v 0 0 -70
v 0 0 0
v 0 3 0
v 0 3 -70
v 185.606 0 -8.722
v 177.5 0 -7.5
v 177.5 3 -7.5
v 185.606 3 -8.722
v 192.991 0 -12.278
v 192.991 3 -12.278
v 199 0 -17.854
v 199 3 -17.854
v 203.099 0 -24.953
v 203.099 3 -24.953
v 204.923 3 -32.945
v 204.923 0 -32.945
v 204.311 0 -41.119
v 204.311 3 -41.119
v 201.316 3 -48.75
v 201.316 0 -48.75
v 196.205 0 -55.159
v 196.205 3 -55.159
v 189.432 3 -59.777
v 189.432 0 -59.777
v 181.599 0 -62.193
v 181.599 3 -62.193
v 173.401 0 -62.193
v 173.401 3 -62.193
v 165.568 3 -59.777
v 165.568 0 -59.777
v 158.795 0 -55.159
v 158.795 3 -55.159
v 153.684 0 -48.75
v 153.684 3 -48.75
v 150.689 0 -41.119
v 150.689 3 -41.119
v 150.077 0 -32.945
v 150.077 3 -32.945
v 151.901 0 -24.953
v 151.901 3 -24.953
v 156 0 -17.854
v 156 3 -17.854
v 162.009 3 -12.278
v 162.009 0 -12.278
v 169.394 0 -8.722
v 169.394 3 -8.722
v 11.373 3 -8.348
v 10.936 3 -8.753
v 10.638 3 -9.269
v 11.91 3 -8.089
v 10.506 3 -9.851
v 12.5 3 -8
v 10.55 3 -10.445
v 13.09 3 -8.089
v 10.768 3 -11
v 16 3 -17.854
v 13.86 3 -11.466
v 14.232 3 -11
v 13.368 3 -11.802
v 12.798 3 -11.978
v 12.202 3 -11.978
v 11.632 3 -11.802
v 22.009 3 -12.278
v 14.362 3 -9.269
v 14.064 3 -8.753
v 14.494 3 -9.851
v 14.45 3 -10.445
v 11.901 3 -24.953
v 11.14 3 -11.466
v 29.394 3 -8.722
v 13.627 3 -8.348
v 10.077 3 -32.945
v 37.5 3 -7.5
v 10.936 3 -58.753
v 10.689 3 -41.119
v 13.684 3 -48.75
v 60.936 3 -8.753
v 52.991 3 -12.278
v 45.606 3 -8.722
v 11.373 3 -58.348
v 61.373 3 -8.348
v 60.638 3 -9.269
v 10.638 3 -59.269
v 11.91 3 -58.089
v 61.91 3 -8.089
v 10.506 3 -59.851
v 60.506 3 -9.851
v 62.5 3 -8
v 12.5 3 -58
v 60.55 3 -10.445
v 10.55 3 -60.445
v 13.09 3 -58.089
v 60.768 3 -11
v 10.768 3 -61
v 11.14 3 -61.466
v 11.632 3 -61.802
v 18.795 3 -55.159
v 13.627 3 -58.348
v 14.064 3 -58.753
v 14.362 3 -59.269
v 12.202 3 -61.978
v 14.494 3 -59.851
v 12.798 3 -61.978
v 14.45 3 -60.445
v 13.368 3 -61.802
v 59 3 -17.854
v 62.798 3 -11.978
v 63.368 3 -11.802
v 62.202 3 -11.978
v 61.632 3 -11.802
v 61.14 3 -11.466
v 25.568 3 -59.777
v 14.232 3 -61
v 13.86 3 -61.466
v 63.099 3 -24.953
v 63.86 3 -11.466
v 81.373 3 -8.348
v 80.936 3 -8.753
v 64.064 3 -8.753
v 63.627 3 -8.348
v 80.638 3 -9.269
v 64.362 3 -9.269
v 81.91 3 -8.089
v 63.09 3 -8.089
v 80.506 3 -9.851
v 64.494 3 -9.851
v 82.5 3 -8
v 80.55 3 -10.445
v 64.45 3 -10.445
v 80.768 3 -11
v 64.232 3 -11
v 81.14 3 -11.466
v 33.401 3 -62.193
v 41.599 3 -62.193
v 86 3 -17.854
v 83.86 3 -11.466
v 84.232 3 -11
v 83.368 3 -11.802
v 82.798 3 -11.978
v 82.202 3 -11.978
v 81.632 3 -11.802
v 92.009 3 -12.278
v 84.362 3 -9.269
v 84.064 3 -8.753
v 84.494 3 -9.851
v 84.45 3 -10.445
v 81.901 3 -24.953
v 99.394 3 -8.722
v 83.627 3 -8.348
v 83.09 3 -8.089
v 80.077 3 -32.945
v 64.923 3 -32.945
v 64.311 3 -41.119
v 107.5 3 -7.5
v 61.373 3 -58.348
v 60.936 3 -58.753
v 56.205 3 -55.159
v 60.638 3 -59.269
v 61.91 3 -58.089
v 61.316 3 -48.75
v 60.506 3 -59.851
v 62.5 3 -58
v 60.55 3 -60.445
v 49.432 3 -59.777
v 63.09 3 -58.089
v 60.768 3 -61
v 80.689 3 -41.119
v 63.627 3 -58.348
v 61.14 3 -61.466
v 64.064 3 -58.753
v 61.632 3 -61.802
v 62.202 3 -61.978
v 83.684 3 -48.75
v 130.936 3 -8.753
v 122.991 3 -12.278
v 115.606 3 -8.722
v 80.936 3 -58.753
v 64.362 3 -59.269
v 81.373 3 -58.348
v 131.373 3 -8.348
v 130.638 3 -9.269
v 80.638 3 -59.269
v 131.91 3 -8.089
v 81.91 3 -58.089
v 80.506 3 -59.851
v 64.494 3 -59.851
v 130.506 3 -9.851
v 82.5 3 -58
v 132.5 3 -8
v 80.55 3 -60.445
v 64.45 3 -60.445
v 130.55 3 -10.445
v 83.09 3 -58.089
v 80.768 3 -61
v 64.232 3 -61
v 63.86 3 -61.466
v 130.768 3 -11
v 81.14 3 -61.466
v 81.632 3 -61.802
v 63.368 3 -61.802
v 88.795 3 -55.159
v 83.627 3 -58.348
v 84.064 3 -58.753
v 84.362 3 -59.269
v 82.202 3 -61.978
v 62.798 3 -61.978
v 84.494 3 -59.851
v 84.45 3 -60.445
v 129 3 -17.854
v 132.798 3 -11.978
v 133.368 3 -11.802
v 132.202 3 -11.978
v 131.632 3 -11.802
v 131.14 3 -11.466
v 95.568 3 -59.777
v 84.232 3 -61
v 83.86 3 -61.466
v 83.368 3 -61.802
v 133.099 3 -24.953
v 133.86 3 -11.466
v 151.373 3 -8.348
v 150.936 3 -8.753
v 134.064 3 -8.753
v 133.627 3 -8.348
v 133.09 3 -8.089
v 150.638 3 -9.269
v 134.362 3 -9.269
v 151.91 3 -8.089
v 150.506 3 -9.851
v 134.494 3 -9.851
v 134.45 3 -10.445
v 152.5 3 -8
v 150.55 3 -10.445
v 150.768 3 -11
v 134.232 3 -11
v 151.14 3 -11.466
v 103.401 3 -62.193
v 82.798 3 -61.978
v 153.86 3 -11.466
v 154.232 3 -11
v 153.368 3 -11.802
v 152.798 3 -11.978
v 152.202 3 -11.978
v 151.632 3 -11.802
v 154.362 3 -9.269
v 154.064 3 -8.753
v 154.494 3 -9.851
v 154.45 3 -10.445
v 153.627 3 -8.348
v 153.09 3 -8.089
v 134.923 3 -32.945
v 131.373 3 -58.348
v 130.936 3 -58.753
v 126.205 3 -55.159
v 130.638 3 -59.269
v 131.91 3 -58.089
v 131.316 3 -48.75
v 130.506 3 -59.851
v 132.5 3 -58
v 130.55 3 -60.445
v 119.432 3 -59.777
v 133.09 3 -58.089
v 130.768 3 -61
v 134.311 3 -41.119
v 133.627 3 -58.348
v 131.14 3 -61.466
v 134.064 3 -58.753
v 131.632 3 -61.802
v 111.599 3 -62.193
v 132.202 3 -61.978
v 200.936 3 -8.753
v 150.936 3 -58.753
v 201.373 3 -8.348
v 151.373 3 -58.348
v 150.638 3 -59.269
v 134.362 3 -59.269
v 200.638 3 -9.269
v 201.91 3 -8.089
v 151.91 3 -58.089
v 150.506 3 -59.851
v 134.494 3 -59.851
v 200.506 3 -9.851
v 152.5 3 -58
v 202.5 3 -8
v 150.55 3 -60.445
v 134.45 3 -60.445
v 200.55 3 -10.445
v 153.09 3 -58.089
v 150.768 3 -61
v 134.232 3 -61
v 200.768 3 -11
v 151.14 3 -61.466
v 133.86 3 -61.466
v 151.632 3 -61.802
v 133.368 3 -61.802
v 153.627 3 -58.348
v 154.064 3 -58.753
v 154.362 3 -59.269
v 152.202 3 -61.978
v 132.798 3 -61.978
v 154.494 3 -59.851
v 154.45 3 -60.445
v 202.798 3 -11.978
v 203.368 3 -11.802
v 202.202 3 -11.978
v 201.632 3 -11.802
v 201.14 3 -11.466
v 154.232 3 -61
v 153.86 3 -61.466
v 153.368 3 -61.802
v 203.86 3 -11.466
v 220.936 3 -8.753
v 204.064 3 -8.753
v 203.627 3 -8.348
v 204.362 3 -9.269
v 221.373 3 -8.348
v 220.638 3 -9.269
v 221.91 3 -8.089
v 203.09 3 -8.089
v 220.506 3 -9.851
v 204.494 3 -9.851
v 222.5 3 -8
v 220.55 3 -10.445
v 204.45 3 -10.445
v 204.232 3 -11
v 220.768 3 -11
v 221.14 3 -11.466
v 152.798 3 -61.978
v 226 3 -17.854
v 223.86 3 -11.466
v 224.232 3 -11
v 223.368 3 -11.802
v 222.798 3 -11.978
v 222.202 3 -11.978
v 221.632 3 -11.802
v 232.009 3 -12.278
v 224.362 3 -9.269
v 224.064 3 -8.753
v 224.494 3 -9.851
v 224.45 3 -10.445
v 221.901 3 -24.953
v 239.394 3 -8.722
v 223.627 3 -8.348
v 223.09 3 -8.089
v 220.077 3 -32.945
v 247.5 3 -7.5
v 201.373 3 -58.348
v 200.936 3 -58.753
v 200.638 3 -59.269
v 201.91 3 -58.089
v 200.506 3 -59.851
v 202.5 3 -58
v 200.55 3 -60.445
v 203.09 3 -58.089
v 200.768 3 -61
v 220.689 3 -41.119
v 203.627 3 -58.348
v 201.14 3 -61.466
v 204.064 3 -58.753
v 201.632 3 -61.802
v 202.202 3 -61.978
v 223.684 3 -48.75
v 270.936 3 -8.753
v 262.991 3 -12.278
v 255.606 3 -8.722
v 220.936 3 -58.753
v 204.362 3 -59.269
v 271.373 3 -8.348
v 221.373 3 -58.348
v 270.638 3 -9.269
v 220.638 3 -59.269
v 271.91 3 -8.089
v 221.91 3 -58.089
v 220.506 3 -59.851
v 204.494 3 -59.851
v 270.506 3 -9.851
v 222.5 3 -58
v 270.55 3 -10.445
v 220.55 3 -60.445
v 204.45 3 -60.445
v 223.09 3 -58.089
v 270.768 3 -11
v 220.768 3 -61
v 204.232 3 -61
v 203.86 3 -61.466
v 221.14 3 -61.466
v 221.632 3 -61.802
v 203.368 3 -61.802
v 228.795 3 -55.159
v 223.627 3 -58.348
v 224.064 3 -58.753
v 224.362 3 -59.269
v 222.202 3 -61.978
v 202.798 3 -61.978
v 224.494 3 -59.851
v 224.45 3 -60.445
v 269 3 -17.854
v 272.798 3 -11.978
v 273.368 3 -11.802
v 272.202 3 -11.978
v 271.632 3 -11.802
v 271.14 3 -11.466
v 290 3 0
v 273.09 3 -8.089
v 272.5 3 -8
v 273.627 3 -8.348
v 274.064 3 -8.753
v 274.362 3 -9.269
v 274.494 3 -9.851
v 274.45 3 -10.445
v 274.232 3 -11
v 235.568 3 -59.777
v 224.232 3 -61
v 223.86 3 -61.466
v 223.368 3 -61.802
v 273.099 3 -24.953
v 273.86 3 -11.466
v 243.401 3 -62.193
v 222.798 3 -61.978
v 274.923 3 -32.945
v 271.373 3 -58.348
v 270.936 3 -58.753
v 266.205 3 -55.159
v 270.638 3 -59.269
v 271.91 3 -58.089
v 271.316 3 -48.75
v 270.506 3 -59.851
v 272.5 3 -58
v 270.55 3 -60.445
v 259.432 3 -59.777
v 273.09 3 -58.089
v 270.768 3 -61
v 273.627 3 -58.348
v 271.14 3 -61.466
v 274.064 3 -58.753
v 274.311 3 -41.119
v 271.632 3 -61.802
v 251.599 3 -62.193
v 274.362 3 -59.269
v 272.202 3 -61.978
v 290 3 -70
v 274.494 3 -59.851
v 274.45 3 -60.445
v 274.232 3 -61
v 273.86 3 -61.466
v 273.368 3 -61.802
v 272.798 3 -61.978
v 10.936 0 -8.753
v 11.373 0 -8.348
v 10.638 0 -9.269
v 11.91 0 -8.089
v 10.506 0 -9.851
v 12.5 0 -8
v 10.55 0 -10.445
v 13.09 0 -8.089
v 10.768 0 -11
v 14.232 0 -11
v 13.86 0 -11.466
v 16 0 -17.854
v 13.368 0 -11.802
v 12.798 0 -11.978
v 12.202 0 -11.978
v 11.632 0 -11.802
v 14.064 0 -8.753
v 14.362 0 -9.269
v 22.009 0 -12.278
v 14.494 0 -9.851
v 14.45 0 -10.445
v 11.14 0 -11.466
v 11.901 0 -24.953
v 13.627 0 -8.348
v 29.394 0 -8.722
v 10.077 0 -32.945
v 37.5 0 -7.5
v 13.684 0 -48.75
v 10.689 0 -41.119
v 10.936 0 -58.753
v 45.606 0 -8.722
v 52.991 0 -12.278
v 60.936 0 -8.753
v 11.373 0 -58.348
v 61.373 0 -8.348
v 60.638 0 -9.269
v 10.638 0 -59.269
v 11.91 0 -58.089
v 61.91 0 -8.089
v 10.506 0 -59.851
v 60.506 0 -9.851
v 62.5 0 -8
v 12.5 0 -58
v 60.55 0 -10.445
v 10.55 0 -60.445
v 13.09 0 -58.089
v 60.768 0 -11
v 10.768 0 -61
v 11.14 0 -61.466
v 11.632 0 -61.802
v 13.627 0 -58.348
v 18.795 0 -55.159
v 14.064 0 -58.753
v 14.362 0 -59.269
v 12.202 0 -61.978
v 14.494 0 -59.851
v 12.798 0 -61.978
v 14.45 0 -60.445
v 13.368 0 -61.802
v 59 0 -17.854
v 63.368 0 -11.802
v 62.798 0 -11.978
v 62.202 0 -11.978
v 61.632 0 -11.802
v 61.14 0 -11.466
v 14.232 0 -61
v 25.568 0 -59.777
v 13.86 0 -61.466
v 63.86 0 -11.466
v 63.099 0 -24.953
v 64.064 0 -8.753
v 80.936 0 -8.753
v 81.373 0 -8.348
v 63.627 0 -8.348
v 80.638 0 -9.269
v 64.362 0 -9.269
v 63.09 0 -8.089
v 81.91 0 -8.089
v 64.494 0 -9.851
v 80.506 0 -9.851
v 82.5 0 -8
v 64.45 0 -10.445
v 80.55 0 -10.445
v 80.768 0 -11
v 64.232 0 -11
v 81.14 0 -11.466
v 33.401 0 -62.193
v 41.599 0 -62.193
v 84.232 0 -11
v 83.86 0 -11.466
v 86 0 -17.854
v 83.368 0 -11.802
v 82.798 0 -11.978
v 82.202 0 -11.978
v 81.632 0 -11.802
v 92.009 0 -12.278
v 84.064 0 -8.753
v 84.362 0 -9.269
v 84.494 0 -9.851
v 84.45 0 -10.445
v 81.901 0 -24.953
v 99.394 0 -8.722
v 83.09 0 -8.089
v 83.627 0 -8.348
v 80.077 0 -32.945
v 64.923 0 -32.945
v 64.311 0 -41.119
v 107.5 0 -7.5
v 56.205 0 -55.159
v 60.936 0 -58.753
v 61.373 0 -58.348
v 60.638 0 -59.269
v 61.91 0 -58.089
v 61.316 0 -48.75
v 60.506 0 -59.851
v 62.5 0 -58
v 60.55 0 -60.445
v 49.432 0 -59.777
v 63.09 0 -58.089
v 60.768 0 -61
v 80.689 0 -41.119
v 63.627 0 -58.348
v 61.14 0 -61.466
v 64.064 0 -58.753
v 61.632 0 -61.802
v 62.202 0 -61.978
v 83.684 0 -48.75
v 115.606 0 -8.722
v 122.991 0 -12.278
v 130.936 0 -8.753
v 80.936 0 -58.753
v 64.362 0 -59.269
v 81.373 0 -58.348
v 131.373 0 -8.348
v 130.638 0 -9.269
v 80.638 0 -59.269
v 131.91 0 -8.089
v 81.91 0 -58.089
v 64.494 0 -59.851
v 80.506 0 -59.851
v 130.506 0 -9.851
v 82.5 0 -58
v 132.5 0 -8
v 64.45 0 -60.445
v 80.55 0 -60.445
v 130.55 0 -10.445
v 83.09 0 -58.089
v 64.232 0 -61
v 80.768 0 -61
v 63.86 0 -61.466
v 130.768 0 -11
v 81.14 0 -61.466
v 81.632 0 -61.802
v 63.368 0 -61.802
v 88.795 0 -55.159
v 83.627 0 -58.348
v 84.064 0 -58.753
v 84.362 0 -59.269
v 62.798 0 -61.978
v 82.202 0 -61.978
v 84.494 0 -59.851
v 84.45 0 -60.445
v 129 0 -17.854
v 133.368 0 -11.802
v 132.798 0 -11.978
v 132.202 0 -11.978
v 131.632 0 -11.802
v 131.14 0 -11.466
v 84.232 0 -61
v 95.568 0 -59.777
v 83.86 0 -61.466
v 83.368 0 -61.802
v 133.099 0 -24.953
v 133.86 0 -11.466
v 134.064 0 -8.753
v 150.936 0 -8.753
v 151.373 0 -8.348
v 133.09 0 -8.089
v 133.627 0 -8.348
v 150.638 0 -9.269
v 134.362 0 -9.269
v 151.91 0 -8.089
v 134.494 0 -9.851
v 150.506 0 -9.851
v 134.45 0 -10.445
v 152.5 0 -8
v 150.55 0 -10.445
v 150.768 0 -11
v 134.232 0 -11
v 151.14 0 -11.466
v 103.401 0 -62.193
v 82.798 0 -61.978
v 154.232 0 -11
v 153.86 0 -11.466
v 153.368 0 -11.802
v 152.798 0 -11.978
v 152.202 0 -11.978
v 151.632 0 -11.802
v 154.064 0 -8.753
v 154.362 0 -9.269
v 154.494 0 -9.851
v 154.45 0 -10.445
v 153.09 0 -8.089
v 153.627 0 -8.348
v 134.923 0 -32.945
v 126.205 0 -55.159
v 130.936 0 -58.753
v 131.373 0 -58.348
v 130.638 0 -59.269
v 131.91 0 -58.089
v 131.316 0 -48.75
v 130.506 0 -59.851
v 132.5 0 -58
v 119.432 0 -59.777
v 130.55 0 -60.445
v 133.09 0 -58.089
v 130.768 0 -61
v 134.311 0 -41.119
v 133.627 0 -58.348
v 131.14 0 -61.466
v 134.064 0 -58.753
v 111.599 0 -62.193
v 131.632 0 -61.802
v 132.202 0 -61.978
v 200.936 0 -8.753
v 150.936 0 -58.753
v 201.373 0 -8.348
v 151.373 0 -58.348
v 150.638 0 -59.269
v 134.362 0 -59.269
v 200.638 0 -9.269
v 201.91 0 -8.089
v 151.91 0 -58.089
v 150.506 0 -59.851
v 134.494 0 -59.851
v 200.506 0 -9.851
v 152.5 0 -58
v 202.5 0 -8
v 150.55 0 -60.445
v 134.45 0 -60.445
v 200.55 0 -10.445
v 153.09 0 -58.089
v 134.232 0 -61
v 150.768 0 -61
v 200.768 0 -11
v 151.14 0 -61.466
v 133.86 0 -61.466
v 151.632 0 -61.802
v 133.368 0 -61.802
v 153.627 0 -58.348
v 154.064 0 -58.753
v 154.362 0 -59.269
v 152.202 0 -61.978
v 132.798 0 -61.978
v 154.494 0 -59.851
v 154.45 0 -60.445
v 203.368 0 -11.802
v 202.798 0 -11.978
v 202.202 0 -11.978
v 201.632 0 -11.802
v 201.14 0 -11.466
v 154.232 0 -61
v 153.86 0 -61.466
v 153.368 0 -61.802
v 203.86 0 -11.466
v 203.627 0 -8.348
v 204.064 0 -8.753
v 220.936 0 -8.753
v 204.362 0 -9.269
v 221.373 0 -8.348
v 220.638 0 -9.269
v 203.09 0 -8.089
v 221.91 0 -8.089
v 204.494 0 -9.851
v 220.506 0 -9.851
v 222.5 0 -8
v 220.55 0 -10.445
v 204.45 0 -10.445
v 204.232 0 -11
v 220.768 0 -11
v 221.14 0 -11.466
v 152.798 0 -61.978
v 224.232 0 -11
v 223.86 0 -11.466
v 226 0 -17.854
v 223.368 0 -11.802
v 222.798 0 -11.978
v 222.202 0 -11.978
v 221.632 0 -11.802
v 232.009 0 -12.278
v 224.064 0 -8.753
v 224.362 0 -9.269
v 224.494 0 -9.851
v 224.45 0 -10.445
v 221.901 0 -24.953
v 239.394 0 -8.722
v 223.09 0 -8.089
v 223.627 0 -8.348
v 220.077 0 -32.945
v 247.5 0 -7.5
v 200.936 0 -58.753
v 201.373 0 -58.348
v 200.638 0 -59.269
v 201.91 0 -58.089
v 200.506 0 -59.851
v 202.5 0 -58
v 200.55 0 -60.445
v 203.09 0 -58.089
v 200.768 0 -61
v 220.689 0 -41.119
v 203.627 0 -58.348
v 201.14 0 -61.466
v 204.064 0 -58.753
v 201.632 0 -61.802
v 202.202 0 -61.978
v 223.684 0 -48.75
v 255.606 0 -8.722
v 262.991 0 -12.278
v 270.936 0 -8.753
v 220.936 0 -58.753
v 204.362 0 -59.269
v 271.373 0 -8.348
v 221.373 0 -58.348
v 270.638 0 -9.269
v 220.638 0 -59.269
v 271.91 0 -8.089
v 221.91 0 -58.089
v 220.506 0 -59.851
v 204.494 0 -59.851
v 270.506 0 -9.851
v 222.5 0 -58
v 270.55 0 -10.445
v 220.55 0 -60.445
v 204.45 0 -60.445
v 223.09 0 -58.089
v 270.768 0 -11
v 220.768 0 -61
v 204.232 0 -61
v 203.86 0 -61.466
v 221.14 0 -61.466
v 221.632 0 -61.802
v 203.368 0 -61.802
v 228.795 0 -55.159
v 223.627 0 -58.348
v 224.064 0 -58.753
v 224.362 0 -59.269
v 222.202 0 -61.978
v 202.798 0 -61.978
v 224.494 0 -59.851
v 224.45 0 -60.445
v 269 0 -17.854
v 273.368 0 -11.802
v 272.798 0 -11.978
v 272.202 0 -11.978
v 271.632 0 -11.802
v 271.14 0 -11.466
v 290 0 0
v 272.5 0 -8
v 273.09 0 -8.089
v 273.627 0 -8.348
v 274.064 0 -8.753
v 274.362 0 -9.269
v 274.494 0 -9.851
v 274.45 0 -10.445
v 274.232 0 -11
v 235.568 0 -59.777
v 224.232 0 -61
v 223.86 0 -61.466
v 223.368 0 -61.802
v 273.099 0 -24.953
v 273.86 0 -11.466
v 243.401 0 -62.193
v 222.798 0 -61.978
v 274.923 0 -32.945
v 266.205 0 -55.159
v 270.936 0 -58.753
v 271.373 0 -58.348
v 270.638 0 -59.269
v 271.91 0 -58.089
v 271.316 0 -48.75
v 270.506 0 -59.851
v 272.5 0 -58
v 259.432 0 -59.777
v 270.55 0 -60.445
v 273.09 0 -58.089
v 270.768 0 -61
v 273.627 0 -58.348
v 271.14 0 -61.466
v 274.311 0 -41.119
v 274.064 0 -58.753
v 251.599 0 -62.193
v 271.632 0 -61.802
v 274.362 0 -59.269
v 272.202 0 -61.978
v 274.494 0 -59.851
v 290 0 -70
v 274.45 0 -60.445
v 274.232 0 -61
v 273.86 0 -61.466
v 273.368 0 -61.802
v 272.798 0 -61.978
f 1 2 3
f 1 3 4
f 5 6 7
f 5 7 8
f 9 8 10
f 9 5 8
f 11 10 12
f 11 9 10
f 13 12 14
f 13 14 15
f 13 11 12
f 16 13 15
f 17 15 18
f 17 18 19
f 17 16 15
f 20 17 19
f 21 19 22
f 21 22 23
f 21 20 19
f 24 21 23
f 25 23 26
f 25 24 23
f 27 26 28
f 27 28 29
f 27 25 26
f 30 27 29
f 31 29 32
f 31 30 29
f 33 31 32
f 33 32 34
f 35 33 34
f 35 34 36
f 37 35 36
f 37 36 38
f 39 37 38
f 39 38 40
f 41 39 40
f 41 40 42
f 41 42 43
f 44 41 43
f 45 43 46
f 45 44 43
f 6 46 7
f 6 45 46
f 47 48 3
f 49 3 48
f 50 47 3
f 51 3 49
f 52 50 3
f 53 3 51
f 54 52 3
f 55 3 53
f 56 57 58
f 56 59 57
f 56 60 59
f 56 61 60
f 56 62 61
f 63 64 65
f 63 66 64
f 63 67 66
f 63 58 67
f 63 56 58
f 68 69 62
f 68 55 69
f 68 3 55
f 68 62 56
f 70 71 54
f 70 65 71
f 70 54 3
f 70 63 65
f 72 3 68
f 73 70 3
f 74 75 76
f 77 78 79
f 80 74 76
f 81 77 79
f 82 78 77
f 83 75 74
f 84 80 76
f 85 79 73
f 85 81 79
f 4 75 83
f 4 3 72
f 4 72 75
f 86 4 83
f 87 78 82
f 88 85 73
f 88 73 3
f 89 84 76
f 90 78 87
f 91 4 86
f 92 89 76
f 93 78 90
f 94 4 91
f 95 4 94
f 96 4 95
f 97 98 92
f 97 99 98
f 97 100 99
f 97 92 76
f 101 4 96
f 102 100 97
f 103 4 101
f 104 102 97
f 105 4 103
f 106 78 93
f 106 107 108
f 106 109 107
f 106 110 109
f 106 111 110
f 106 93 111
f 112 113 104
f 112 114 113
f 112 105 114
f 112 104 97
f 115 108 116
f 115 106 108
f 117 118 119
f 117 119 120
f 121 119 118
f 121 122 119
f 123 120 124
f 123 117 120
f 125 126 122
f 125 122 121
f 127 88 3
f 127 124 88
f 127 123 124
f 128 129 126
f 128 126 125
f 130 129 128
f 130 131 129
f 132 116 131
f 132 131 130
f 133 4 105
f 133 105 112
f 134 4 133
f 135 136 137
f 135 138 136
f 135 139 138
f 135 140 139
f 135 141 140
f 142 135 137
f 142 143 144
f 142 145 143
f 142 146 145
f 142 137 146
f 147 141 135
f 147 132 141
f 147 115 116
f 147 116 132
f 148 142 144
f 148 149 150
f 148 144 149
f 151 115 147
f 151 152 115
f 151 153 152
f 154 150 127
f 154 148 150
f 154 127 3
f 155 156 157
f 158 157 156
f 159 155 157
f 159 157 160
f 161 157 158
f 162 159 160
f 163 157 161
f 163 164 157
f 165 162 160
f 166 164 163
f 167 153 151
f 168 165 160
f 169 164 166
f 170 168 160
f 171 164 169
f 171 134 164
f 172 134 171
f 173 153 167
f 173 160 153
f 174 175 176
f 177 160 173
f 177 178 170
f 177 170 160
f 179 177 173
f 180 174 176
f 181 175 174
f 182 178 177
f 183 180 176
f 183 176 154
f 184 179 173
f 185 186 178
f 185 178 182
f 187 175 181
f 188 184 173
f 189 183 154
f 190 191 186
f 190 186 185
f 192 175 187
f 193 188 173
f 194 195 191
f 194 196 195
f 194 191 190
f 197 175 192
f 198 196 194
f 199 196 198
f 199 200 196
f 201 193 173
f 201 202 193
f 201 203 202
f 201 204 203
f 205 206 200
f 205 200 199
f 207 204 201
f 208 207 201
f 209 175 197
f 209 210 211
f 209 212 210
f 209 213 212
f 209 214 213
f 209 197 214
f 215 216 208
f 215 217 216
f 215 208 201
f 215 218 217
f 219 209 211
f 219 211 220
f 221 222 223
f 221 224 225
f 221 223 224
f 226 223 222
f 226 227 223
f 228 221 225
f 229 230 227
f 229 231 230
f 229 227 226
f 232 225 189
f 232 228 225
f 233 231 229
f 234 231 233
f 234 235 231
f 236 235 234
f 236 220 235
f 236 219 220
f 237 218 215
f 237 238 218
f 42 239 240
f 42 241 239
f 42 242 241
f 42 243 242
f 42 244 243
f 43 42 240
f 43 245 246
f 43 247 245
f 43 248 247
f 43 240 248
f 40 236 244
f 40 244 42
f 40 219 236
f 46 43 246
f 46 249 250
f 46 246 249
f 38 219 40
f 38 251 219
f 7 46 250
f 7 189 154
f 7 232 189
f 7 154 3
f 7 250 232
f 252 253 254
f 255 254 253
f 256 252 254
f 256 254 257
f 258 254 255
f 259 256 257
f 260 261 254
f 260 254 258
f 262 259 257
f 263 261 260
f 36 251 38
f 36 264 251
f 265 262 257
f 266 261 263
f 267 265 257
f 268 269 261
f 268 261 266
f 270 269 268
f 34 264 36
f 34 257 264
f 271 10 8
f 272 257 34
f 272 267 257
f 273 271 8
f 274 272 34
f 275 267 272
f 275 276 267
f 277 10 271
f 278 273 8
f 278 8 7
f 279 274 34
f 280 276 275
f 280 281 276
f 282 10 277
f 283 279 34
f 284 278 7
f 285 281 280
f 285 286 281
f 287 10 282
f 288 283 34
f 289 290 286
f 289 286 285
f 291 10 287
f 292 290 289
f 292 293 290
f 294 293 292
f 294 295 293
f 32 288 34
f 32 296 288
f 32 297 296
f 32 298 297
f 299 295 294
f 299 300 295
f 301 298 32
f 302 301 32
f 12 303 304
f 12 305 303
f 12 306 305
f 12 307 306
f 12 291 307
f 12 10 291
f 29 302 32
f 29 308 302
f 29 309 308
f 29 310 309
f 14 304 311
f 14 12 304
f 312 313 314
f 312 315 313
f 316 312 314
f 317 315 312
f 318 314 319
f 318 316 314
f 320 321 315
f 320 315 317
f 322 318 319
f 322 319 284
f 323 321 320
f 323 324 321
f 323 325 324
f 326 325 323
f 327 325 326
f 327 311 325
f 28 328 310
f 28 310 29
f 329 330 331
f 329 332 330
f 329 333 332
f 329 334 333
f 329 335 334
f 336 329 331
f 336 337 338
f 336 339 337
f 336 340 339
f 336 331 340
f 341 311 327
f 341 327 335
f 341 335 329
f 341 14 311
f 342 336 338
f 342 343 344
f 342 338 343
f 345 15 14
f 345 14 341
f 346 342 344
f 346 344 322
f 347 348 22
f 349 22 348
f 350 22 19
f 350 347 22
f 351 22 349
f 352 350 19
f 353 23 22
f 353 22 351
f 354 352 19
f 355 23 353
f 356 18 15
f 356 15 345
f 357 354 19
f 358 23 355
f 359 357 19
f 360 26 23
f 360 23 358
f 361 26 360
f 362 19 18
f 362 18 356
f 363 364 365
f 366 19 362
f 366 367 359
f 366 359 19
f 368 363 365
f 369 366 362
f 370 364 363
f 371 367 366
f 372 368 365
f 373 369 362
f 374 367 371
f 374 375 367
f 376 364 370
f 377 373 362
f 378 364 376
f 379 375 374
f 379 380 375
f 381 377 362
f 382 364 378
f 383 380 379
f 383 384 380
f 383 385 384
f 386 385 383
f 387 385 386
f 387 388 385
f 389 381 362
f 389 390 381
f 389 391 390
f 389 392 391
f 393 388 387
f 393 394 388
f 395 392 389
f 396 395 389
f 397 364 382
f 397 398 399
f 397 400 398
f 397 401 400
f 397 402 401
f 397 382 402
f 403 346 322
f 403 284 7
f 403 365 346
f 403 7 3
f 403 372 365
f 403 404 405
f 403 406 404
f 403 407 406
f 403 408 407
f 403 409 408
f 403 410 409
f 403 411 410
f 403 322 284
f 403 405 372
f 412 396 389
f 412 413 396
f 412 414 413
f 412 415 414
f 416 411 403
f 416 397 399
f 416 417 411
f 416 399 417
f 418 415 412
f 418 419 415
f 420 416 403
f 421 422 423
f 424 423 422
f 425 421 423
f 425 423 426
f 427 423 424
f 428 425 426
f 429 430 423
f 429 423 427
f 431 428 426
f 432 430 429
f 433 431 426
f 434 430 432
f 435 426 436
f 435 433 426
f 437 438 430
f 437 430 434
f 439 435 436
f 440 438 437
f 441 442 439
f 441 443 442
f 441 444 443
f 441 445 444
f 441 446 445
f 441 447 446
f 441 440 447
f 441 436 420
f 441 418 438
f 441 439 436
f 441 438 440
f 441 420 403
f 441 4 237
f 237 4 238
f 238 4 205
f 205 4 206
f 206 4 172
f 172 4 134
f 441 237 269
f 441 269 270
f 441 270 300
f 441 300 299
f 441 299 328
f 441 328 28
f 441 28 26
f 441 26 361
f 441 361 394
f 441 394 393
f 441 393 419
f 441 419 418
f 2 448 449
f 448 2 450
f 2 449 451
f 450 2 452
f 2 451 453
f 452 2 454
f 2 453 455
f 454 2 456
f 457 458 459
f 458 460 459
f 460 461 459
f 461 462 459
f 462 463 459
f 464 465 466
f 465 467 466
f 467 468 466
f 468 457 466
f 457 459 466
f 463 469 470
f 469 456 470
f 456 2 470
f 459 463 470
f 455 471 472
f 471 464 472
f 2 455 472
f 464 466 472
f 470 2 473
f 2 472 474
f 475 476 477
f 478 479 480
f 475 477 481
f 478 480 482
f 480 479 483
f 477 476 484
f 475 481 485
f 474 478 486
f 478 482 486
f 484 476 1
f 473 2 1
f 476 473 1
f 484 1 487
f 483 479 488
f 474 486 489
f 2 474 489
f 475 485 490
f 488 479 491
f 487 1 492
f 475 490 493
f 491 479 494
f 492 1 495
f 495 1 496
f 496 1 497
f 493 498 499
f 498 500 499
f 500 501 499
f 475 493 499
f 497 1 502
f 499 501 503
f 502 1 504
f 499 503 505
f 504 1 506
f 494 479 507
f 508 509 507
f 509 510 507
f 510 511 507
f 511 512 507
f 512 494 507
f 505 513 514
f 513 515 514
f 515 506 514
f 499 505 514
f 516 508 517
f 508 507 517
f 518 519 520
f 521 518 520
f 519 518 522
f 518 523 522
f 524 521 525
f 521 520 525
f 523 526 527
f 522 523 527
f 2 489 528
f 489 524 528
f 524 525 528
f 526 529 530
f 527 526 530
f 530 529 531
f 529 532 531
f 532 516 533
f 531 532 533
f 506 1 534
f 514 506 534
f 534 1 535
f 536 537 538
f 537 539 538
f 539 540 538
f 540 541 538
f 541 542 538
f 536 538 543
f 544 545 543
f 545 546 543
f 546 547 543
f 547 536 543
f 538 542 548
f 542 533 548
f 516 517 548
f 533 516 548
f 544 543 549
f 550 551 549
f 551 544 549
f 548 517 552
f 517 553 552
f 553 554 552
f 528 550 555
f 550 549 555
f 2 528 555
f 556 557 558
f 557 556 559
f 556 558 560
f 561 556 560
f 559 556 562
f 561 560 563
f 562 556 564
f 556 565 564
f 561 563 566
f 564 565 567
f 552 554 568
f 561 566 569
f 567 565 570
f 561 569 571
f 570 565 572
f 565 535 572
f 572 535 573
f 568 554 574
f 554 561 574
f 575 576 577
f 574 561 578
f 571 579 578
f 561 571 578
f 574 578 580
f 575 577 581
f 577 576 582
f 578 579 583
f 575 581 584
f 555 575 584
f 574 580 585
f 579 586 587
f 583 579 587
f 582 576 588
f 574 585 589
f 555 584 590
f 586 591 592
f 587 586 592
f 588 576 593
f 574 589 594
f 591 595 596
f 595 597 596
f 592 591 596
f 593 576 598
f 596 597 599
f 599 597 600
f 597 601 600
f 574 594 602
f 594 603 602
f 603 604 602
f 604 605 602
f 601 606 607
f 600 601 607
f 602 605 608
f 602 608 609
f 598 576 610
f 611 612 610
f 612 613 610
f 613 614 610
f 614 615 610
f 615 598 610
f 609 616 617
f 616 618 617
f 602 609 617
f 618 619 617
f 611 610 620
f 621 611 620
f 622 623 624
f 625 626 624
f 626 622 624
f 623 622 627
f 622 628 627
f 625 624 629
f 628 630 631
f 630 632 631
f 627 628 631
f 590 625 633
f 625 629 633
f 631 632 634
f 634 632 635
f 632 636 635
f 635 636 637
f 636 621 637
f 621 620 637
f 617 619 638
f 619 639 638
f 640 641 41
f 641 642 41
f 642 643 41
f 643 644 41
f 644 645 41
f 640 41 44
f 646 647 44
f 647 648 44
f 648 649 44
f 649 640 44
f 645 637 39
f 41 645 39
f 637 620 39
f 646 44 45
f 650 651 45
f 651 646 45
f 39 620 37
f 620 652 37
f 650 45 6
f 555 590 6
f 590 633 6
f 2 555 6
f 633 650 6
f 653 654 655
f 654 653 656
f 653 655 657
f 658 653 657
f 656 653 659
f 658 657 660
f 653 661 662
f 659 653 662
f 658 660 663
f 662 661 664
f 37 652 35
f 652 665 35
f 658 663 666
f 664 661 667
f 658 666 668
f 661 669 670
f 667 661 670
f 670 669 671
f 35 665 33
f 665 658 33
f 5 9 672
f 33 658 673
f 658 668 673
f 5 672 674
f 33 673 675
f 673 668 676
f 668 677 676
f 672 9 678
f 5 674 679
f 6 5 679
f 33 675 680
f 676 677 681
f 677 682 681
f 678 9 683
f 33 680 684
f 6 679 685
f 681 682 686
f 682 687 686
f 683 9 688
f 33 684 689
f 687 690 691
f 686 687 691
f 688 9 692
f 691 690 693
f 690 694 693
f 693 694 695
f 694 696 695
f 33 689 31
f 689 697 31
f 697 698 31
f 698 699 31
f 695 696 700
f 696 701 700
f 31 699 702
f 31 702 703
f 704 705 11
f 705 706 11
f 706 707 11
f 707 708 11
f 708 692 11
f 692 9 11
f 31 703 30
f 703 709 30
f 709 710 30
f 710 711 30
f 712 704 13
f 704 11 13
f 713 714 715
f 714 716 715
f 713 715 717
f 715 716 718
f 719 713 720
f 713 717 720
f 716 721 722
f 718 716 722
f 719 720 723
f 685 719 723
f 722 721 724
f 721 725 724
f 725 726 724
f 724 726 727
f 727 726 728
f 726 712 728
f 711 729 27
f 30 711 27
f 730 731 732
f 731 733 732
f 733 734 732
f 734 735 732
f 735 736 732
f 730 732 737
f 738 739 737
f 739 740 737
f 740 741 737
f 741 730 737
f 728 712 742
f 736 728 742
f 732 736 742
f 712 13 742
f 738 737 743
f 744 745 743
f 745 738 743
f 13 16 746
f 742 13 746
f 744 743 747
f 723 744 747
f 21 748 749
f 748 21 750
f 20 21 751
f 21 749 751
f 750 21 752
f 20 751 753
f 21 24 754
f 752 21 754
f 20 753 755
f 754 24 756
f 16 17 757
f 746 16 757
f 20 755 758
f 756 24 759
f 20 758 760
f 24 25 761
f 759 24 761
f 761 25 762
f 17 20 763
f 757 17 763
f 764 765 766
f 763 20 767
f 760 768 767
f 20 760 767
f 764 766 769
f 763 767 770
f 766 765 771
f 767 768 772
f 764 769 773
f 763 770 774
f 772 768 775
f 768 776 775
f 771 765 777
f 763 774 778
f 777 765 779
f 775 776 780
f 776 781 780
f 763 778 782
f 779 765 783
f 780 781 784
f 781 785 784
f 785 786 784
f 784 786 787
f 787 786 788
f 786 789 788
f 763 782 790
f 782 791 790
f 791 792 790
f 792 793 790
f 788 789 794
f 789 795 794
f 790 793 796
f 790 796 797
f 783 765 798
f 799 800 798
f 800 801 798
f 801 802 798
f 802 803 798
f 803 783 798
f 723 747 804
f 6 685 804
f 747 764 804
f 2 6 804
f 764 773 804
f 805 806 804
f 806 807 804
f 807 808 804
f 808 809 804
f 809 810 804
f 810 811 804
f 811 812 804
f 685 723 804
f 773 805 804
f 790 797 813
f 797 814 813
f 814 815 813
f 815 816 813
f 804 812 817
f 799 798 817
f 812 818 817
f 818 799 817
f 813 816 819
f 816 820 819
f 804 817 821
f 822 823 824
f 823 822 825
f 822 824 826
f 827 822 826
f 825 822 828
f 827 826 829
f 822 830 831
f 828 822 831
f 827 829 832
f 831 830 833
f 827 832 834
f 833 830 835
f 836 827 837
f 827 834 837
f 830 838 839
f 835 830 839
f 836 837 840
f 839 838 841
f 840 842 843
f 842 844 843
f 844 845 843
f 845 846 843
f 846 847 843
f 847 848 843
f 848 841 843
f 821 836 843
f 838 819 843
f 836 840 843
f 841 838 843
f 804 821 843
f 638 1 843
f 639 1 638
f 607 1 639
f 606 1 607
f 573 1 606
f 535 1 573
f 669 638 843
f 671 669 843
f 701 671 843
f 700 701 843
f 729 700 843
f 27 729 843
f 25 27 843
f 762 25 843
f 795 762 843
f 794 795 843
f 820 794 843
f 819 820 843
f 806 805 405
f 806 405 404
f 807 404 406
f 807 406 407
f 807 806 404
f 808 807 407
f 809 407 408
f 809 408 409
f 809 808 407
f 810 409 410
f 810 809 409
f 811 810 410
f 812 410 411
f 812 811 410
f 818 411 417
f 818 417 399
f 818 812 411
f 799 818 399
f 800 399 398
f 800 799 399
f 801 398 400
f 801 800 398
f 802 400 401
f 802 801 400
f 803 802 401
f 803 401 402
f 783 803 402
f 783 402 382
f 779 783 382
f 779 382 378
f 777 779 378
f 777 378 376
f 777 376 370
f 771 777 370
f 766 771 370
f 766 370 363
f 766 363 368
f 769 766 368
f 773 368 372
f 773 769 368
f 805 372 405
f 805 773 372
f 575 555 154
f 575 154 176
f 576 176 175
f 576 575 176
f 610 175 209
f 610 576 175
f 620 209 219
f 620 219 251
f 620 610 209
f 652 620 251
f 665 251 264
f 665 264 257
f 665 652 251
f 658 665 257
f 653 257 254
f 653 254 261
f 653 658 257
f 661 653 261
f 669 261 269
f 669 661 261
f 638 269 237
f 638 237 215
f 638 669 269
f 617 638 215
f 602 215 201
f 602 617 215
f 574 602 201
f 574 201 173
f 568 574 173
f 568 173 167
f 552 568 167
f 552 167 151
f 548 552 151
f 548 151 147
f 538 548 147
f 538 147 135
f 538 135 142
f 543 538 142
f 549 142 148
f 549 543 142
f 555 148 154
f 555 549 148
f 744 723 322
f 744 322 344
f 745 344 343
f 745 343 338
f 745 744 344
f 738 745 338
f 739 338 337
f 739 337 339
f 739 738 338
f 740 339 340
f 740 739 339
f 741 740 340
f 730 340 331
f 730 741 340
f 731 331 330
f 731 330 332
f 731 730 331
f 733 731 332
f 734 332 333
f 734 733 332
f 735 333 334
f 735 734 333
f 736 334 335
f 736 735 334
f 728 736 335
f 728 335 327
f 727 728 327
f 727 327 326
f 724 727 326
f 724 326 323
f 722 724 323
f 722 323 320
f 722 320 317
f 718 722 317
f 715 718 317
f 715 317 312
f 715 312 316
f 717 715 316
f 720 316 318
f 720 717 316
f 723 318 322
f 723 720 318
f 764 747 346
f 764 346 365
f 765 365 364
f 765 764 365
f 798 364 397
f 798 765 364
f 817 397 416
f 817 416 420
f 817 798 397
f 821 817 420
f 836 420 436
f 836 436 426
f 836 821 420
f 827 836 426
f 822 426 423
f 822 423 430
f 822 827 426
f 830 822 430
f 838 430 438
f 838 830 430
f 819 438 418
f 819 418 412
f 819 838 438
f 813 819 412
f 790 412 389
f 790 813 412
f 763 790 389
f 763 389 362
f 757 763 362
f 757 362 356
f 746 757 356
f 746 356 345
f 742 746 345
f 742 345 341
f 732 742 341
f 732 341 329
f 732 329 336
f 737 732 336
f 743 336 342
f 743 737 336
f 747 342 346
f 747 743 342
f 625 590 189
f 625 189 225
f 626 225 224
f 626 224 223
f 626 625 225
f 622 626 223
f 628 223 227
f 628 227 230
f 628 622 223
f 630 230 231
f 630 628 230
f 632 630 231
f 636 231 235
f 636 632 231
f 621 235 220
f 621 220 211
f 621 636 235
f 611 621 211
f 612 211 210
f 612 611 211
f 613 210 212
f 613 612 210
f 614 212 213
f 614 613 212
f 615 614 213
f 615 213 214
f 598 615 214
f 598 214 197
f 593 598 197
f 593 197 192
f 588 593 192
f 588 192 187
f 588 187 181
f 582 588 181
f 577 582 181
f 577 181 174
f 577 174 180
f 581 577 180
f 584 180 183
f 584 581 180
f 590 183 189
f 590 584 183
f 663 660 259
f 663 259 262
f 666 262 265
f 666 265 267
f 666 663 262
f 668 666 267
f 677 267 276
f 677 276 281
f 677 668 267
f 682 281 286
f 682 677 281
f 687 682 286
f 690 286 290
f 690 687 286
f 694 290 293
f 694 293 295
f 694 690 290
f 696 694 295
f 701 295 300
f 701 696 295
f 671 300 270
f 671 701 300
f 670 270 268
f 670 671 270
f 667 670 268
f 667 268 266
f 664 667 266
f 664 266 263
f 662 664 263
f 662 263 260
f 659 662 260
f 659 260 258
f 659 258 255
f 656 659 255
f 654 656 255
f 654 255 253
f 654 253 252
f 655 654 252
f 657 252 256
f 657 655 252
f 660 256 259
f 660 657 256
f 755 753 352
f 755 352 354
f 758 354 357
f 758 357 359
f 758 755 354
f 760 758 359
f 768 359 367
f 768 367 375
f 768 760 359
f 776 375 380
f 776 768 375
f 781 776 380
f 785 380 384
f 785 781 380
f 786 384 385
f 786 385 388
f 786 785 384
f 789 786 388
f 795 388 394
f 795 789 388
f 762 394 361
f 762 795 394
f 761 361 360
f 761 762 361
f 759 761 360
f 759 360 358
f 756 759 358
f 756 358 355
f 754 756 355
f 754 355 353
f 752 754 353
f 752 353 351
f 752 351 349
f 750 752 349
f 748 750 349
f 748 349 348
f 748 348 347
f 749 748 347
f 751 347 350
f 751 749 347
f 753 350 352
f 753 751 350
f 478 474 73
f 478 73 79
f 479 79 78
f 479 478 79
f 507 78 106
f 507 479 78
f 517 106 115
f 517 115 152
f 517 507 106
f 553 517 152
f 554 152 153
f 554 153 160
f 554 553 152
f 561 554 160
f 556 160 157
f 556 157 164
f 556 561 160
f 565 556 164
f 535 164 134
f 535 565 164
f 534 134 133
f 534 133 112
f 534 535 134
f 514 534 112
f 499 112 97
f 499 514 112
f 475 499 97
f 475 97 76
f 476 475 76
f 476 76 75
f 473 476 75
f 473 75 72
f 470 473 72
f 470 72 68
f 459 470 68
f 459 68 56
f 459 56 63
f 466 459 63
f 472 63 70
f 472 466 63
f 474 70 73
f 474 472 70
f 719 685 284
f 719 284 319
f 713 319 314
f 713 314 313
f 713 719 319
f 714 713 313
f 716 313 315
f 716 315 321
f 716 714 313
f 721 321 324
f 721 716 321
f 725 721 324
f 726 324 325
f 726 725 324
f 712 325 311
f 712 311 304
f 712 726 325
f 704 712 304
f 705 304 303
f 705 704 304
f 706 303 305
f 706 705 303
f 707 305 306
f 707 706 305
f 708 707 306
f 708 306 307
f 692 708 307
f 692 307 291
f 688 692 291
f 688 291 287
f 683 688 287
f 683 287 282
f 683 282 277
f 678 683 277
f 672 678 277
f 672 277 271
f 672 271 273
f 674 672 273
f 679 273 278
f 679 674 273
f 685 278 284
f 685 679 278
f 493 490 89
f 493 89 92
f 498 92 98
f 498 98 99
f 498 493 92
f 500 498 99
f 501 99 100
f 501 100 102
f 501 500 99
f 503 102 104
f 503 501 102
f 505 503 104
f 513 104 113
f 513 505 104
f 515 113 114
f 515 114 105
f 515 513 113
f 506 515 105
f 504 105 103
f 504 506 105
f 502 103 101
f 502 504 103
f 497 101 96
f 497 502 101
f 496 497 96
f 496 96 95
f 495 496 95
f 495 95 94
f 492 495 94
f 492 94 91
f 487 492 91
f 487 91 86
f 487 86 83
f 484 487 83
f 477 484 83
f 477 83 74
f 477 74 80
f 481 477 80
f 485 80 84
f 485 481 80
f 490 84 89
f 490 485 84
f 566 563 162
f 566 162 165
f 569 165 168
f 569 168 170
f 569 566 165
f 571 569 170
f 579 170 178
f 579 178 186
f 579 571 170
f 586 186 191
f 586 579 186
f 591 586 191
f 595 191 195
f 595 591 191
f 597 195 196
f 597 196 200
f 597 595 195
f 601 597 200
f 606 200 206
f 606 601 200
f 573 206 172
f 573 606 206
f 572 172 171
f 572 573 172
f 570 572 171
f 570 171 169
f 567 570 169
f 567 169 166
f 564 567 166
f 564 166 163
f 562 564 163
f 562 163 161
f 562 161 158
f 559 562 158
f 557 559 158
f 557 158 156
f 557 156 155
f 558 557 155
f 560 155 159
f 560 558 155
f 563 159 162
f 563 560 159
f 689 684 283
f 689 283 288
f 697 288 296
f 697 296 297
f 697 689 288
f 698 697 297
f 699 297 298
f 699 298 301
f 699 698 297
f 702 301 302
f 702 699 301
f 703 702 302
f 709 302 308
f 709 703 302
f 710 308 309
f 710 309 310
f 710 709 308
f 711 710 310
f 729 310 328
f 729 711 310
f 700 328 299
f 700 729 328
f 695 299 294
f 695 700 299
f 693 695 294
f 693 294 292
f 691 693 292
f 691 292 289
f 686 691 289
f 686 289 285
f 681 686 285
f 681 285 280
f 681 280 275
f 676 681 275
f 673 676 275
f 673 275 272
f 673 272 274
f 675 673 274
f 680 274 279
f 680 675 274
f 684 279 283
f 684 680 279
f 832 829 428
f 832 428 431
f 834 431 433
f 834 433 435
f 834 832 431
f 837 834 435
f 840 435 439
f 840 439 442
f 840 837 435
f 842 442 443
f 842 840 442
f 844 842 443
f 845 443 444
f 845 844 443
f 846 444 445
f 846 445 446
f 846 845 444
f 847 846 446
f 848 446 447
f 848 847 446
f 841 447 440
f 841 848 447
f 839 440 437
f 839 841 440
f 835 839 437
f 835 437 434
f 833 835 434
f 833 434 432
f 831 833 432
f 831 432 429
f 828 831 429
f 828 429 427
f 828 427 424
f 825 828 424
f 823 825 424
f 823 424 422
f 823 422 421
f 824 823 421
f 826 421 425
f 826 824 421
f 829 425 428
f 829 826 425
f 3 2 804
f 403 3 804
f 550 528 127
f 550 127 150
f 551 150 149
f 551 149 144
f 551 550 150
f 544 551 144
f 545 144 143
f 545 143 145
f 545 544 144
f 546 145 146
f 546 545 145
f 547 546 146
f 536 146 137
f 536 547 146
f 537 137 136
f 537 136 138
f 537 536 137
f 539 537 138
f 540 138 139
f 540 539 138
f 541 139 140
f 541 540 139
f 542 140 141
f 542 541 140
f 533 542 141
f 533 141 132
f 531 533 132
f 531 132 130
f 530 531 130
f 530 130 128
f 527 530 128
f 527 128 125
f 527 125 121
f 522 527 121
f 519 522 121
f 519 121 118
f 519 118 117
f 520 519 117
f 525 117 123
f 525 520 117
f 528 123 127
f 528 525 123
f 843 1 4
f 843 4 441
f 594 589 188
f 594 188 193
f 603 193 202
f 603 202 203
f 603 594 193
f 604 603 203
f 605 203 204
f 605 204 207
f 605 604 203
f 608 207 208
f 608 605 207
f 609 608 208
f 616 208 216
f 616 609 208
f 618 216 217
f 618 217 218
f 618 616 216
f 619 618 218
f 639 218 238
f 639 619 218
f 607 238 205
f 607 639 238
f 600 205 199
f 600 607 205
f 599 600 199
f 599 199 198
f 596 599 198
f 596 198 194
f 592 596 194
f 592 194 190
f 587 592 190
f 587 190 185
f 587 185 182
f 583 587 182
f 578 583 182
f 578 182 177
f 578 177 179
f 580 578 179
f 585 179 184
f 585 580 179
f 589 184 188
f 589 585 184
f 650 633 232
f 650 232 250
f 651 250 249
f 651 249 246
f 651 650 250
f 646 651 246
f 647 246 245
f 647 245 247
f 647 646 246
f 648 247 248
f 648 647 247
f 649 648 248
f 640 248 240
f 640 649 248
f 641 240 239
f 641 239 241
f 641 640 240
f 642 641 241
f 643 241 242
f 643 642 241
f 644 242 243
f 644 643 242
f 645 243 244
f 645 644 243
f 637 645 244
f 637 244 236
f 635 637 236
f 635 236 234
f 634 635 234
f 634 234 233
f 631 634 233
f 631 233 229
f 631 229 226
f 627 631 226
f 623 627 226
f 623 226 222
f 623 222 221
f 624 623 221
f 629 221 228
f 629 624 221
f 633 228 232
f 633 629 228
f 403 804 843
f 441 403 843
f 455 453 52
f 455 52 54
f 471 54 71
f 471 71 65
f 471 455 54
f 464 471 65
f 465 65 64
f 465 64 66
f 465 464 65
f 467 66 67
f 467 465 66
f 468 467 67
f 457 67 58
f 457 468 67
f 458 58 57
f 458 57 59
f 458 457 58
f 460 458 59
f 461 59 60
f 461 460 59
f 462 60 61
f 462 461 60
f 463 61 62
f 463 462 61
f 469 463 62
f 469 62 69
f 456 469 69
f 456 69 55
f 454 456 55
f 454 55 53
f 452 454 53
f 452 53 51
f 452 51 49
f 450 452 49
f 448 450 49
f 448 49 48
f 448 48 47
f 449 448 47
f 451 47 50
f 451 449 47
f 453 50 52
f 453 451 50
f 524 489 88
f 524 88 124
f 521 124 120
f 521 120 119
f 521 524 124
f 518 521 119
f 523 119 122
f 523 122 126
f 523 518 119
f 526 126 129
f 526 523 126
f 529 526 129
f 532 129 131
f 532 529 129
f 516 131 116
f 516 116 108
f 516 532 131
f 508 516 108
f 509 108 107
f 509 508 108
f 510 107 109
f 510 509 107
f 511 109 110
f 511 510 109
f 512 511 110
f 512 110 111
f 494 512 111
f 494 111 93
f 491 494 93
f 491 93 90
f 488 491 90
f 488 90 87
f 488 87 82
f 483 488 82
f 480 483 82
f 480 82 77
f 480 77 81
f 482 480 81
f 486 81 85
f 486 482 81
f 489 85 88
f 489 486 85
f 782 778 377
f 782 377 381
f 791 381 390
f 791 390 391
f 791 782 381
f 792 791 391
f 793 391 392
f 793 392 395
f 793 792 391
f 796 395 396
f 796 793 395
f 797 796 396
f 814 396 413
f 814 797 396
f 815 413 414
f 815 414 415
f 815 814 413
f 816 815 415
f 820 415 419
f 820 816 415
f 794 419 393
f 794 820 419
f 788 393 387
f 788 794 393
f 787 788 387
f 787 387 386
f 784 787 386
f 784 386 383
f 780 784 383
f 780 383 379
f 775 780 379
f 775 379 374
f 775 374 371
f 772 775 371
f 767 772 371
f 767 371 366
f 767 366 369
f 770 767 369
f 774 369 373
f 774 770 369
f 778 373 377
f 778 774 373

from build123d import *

# Parameters (mm, degrees)
IZIM1_W                     = 290
IZIM1_H                     = 70
IZIM1_R                     = 27.5
IZIM1_R_2                   = 2
Y_KSEKLIK_EKSTR_ZYON1_DEPTH = 3


with BuildPart() as part:
    # Çizim1 → Yükseklik-Ekstrüzyon1 (new body)
    with BuildSketch(Plane(origin=(0, 0, 0), x_dir=(1, 0, 0), z_dir=(0, 1, 0))):
        with Locations((145, 35)):
            Rectangle(IZIM1_W, IZIM1_H)
        with Locations(Location((37.5, 35, 0), (0, 0, 270))):
            Circle(IZIM1_R, mode=Mode.SUBTRACT)
        with Locations(Location((12.5, 60, 0), (0, 0, 270))):
            Circle(IZIM1_R_2, mode=Mode.SUBTRACT)
        with Locations(Location((62.5, 60, 0), (0, 0, 270))):
            Circle(IZIM1_R_2, mode=Mode.SUBTRACT)
        with Locations(Location((62.5, 10, 0), (0, 0, 270))):
            Circle(IZIM1_R_2, mode=Mode.SUBTRACT)
        with Locations(Location((12.5, 10, 0), (0, 0, 270))):
            Circle(IZIM1_R_2, mode=Mode.SUBTRACT)
        with Locations(Location((107.5, 35, 0), (0, 0, 270))):
            Circle(IZIM1_R, mode=Mode.SUBTRACT)
        with Locations(Location((132.5, 60, 0), (0, 0, 270))):
            Circle(IZIM1_R_2, mode=Mode.SUBTRACT)
        with Locations(Location((132.5, 10, 0), (0, 0, 270))):
            Circle(IZIM1_R_2, mode=Mode.SUBTRACT)
        with Locations(Location((82.5, 10, 0), (0, 0, 270))):
            Circle(IZIM1_R_2, mode=Mode.SUBTRACT)
        with Locations(Location((82.5, 60, 0), (0, 0, 270))):
            Circle(IZIM1_R_2, mode=Mode.SUBTRACT)
        with Locations(Location((177.5, 35, 0), (0, 0, 270))):
            Circle(IZIM1_R, mode=Mode.SUBTRACT)
        with Locations(Location((202.5, 60, 0), (0, 0, 270))):
            Circle(IZIM1_R_2, mode=Mode.SUBTRACT)
        with Locations(Location((202.5, 10, 0), (0, 0, 270))):
            Circle(IZIM1_R_2, mode=Mode.SUBTRACT)
        with Locations(Location((152.5, 10, 0), (0, 0, 270))):
            Circle(IZIM1_R_2, mode=Mode.SUBTRACT)
        with Locations(Location((152.5, 60, 0), (0, 0, 270))):
            Circle(IZIM1_R_2, mode=Mode.SUBTRACT)
        with Locations(Location((247.5, 35, 0), (0, 0, 270))):
            Circle(IZIM1_R, mode=Mode.SUBTRACT)
        with Locations(Location((272.5, 60, 0), (0, 0, 270))):
            Circle(IZIM1_R_2, mode=Mode.SUBTRACT)
        with Locations(Location((272.5, 10, 0), (0, 0, 270))):
            Circle(IZIM1_R_2, mode=Mode.SUBTRACT)
        with Locations(Location((222.5, 10, 0), (0, 0, 270))):
            Circle(IZIM1_R_2, mode=Mode.SUBTRACT)
        with Locations(Location((222.5, 60, 0), (0, 0, 270))):
            Circle(IZIM1_R_2, mode=Mode.SUBTRACT)
    extrude(amount=Y_KSEKLIK_EKSTR_ZYON1_DEPTH)


solid = part.part
